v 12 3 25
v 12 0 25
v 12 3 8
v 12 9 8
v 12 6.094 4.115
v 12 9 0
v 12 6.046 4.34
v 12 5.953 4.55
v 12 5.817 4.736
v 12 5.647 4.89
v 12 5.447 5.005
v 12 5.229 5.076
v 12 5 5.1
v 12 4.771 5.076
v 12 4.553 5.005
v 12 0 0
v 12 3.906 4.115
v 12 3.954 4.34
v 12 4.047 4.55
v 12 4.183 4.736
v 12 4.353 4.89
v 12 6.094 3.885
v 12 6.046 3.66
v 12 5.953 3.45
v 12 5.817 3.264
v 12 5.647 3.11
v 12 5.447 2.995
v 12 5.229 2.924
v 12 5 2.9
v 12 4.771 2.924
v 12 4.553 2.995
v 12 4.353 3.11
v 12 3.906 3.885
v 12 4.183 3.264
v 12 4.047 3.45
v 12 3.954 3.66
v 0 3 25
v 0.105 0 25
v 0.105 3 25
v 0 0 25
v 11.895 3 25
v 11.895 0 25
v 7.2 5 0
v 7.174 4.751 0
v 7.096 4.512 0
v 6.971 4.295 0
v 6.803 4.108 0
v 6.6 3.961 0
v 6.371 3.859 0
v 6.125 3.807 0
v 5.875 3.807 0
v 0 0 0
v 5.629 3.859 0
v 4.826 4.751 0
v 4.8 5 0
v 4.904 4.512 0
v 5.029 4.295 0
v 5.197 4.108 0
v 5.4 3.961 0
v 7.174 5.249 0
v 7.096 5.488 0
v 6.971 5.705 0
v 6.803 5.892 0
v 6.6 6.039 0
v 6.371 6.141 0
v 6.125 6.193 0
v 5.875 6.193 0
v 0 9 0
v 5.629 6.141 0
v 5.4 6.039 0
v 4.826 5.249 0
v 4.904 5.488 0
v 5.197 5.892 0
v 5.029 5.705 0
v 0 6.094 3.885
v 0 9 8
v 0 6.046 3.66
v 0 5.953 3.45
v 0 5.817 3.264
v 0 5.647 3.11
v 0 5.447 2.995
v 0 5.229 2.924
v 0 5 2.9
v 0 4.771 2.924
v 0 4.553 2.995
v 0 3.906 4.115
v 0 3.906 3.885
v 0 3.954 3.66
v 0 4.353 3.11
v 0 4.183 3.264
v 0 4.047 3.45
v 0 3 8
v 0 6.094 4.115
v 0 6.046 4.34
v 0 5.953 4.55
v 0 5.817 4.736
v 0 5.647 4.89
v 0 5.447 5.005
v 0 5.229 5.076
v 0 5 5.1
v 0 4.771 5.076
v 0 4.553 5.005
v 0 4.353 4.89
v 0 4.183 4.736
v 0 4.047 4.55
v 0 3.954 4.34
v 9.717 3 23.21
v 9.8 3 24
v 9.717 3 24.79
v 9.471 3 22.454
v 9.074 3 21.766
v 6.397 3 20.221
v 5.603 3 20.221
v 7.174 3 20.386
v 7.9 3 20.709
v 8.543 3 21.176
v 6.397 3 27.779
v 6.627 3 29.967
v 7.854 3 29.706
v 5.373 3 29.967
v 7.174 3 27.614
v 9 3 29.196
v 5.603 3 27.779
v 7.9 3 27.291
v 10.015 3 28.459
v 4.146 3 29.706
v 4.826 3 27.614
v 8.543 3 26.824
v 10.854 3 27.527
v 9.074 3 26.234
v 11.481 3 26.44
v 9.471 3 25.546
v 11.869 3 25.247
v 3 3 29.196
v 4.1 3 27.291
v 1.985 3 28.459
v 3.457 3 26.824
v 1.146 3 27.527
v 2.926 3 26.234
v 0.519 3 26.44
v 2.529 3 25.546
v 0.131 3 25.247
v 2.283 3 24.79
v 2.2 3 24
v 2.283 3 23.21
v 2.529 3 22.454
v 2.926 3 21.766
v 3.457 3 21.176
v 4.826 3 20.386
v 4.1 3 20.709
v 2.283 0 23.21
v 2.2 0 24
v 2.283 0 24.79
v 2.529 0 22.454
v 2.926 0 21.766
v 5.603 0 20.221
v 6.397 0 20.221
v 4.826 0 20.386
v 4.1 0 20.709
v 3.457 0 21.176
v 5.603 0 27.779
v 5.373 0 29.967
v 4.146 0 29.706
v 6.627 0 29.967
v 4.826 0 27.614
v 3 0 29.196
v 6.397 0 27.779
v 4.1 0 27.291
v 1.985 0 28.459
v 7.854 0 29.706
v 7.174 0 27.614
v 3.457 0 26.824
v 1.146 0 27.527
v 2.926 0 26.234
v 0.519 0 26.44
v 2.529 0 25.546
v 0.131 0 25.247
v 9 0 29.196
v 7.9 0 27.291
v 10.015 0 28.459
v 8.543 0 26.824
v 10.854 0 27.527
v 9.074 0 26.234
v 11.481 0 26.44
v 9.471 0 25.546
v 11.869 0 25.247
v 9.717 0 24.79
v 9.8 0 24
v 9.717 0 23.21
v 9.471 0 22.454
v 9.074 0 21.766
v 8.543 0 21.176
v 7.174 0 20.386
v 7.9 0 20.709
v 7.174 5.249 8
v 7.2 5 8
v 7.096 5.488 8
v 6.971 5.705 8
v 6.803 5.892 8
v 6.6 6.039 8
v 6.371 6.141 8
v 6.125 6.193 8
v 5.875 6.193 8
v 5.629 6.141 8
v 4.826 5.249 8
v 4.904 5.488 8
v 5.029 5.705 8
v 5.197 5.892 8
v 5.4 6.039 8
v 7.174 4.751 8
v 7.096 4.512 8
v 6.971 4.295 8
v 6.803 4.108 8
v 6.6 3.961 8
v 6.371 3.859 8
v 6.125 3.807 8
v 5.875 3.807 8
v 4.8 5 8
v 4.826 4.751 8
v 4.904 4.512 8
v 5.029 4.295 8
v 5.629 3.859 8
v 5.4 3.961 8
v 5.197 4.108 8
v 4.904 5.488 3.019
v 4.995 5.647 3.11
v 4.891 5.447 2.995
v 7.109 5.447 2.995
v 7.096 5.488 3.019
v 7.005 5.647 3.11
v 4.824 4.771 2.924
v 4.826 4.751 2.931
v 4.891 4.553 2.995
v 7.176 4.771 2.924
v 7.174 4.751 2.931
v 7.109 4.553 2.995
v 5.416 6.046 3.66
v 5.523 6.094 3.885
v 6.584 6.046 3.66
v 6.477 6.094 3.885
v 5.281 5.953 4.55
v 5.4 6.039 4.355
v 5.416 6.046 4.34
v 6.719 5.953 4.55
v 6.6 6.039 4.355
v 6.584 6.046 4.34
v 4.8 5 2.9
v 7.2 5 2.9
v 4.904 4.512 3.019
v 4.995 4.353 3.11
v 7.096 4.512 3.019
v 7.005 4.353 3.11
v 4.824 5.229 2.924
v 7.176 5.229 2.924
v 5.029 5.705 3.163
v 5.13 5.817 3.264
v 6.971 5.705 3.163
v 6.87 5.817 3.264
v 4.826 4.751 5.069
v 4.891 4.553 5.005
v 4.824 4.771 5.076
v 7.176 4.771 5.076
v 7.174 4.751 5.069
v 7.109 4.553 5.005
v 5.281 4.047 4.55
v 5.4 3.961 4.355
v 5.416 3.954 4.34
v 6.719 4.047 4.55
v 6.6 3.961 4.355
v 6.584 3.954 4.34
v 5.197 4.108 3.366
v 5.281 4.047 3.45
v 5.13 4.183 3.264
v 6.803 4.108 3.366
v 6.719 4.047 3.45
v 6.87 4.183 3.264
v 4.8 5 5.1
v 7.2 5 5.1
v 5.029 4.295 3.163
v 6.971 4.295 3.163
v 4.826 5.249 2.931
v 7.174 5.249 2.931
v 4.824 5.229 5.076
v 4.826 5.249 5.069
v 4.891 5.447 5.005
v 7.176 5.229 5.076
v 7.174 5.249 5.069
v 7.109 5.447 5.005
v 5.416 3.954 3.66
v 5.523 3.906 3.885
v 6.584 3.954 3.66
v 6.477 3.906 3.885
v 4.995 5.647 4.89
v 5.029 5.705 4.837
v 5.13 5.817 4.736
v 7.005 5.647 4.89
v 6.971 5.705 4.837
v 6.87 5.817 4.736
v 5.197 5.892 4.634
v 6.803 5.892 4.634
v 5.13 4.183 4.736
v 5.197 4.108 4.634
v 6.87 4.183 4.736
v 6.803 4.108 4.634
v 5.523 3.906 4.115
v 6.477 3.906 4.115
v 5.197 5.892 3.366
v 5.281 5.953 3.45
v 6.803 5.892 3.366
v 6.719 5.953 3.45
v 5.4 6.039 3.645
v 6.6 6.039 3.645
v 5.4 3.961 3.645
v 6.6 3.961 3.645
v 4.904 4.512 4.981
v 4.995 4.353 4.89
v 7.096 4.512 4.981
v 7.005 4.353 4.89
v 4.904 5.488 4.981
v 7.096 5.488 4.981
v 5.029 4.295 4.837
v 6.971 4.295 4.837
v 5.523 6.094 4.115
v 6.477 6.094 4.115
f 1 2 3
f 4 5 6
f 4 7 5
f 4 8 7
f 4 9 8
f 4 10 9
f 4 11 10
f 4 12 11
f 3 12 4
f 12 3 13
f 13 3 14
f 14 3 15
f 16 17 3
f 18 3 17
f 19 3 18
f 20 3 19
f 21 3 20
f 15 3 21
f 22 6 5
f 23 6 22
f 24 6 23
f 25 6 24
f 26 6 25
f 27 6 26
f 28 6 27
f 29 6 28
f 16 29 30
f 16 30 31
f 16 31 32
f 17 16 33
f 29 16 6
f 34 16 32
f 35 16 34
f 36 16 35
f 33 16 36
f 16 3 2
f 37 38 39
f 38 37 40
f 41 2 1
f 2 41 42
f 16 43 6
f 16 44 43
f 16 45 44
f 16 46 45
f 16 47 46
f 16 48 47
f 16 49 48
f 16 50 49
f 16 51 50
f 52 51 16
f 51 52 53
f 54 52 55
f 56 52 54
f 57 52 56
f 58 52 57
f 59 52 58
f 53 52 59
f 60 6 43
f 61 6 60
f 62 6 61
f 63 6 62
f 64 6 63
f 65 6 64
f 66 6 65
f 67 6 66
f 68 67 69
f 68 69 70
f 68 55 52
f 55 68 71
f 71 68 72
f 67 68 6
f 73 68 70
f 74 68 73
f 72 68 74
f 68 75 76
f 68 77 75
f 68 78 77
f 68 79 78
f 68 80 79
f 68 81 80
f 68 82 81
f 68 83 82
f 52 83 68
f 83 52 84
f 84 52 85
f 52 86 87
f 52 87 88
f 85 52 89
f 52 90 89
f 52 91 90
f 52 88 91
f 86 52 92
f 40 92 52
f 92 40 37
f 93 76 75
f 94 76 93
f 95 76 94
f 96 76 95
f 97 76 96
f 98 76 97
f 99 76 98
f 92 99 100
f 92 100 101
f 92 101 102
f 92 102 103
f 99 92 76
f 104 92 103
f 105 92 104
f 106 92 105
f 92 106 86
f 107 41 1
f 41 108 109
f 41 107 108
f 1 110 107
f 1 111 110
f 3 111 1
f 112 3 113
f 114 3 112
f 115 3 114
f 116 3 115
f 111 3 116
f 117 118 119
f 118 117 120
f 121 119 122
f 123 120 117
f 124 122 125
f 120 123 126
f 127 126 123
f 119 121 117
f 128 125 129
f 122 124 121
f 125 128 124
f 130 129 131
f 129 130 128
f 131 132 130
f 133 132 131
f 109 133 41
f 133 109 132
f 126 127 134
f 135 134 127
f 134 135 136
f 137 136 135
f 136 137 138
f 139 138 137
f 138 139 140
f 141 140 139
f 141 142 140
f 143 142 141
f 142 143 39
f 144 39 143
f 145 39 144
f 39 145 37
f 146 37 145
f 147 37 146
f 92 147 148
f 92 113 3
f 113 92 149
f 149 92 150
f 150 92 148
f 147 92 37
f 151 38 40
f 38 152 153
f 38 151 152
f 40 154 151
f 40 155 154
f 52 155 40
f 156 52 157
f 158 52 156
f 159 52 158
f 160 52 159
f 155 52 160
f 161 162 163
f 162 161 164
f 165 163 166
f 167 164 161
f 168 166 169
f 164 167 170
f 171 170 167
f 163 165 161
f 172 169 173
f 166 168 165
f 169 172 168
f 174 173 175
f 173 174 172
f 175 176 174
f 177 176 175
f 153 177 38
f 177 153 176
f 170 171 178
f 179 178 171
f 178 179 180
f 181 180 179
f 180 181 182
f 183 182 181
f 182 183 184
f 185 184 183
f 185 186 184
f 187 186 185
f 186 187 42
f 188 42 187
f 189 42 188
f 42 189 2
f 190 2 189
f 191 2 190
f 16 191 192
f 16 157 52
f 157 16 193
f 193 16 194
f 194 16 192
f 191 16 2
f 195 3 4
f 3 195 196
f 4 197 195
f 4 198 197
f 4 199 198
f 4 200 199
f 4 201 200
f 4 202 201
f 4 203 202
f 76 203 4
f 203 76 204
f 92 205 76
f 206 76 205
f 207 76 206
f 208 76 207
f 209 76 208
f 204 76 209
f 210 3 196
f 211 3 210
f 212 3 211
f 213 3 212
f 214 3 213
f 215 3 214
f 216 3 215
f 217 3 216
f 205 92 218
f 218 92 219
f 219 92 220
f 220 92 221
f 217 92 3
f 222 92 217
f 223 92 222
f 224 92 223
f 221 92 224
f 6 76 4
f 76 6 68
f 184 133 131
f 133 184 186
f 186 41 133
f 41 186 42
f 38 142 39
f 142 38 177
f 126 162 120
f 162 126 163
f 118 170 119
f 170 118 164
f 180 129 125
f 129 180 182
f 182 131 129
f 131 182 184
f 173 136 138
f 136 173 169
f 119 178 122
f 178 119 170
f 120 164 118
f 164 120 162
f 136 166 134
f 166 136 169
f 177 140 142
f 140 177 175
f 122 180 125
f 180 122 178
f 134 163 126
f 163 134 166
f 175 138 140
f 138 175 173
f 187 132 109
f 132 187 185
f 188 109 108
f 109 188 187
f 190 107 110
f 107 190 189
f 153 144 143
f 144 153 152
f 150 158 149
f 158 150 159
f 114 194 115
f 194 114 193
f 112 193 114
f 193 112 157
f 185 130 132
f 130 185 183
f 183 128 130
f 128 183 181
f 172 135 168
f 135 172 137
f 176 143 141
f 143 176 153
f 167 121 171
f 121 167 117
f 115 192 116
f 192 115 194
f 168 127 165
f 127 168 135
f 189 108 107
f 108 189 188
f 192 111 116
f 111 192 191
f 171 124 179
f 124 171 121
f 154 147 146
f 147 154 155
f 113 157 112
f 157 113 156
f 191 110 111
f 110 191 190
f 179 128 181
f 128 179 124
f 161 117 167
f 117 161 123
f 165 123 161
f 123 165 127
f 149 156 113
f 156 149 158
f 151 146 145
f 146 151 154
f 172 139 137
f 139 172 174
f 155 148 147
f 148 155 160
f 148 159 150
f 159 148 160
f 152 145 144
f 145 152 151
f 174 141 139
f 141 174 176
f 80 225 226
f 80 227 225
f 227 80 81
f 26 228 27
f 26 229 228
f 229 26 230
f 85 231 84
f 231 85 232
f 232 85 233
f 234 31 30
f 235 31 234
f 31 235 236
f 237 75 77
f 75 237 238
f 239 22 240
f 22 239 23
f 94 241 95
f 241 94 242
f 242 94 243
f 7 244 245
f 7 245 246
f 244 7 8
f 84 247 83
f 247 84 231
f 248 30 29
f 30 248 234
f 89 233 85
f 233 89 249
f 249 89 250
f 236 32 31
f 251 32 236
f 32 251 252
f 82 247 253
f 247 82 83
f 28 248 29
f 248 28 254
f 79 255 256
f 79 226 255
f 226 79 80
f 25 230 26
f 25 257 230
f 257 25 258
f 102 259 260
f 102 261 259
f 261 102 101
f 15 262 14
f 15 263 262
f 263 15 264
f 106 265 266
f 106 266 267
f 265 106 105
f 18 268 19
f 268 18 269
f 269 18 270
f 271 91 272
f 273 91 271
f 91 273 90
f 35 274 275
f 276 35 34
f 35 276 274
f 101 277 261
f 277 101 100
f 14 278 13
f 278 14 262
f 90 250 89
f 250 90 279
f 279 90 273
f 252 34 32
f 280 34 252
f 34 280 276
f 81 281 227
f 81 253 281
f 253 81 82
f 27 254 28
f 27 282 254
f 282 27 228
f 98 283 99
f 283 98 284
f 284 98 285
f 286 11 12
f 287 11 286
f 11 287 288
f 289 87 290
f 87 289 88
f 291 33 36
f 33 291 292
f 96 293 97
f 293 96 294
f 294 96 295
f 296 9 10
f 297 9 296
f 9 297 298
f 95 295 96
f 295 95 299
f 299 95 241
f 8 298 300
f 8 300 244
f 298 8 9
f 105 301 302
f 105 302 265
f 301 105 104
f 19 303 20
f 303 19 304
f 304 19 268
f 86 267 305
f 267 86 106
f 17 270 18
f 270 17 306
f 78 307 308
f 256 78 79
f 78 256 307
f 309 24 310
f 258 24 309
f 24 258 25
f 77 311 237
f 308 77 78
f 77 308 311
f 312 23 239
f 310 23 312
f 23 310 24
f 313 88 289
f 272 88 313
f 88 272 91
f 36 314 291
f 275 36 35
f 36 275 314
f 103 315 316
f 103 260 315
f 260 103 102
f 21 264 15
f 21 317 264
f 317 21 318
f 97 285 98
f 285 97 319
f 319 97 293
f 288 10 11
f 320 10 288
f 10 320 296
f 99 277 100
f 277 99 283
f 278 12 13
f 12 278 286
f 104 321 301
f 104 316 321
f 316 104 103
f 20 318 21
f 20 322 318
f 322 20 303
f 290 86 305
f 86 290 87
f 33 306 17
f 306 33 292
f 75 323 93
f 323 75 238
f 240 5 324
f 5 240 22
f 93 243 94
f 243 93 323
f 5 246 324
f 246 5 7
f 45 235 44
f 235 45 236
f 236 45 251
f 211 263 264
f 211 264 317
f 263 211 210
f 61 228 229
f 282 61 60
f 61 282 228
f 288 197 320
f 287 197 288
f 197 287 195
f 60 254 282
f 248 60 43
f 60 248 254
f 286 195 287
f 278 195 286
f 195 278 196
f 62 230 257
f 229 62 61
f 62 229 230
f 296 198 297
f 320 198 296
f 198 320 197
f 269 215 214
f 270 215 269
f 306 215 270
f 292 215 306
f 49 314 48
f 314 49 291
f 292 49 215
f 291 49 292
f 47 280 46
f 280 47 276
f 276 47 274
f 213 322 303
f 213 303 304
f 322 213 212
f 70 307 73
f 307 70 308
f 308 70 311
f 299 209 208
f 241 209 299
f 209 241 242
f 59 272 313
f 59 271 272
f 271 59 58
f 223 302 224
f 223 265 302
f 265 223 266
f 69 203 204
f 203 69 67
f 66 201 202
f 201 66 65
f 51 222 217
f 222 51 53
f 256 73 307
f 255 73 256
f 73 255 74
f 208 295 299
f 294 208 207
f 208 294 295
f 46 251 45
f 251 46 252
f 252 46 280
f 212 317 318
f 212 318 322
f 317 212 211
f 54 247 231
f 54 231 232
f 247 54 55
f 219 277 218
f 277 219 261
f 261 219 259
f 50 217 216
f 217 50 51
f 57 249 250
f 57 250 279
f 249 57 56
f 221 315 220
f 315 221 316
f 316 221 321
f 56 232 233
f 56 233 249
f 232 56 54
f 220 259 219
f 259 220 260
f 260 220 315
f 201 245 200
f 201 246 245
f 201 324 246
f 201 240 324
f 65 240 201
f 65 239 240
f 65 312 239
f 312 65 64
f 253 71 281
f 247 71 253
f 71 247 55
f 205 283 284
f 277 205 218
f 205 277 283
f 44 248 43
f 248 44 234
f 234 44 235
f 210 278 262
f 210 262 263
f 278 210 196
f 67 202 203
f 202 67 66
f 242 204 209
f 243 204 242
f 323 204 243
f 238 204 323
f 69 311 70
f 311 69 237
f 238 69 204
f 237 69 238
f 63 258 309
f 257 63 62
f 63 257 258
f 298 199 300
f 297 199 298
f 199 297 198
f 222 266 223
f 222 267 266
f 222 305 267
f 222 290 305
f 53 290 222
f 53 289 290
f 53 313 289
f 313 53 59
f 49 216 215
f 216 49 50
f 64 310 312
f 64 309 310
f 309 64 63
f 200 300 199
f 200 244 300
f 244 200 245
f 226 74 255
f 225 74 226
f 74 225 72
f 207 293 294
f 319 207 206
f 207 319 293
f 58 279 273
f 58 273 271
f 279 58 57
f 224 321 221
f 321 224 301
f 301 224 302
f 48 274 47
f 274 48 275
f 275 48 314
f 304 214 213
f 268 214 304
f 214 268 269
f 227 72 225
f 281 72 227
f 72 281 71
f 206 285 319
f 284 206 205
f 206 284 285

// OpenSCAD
difference(){
	union(){        
        translate([0,0,0]){
           cube([12,3,25], center=false);
        }
        translate([0,0,0]){
           cube([12,9,8], center=false);
        }
	
        translate([6,3,24]){
            rotate(a = [90,0,0]) {
                cylinder(h=3, r=6, $fn=30, center=false);
            }
        }

        
	}
	union() {
        
        translate([6,10,24]){
            rotate(a = [90,0,0]) {
                cylinder(h=400, r=3.8, $fn=30, center=false);
            }
        }

        translate([-1,5,4]){
            rotate(a = [0,90,0]) {
                cylinder(h=400, r=1.1, $fn=30, center=false);
            }
        }	
        translate([6,5,-10]){
            rotate(a = [0,0,0]) {
                cylinder(h=400, r=1.2, $fn=30, center=false);
            }
        }
	


	}
}
